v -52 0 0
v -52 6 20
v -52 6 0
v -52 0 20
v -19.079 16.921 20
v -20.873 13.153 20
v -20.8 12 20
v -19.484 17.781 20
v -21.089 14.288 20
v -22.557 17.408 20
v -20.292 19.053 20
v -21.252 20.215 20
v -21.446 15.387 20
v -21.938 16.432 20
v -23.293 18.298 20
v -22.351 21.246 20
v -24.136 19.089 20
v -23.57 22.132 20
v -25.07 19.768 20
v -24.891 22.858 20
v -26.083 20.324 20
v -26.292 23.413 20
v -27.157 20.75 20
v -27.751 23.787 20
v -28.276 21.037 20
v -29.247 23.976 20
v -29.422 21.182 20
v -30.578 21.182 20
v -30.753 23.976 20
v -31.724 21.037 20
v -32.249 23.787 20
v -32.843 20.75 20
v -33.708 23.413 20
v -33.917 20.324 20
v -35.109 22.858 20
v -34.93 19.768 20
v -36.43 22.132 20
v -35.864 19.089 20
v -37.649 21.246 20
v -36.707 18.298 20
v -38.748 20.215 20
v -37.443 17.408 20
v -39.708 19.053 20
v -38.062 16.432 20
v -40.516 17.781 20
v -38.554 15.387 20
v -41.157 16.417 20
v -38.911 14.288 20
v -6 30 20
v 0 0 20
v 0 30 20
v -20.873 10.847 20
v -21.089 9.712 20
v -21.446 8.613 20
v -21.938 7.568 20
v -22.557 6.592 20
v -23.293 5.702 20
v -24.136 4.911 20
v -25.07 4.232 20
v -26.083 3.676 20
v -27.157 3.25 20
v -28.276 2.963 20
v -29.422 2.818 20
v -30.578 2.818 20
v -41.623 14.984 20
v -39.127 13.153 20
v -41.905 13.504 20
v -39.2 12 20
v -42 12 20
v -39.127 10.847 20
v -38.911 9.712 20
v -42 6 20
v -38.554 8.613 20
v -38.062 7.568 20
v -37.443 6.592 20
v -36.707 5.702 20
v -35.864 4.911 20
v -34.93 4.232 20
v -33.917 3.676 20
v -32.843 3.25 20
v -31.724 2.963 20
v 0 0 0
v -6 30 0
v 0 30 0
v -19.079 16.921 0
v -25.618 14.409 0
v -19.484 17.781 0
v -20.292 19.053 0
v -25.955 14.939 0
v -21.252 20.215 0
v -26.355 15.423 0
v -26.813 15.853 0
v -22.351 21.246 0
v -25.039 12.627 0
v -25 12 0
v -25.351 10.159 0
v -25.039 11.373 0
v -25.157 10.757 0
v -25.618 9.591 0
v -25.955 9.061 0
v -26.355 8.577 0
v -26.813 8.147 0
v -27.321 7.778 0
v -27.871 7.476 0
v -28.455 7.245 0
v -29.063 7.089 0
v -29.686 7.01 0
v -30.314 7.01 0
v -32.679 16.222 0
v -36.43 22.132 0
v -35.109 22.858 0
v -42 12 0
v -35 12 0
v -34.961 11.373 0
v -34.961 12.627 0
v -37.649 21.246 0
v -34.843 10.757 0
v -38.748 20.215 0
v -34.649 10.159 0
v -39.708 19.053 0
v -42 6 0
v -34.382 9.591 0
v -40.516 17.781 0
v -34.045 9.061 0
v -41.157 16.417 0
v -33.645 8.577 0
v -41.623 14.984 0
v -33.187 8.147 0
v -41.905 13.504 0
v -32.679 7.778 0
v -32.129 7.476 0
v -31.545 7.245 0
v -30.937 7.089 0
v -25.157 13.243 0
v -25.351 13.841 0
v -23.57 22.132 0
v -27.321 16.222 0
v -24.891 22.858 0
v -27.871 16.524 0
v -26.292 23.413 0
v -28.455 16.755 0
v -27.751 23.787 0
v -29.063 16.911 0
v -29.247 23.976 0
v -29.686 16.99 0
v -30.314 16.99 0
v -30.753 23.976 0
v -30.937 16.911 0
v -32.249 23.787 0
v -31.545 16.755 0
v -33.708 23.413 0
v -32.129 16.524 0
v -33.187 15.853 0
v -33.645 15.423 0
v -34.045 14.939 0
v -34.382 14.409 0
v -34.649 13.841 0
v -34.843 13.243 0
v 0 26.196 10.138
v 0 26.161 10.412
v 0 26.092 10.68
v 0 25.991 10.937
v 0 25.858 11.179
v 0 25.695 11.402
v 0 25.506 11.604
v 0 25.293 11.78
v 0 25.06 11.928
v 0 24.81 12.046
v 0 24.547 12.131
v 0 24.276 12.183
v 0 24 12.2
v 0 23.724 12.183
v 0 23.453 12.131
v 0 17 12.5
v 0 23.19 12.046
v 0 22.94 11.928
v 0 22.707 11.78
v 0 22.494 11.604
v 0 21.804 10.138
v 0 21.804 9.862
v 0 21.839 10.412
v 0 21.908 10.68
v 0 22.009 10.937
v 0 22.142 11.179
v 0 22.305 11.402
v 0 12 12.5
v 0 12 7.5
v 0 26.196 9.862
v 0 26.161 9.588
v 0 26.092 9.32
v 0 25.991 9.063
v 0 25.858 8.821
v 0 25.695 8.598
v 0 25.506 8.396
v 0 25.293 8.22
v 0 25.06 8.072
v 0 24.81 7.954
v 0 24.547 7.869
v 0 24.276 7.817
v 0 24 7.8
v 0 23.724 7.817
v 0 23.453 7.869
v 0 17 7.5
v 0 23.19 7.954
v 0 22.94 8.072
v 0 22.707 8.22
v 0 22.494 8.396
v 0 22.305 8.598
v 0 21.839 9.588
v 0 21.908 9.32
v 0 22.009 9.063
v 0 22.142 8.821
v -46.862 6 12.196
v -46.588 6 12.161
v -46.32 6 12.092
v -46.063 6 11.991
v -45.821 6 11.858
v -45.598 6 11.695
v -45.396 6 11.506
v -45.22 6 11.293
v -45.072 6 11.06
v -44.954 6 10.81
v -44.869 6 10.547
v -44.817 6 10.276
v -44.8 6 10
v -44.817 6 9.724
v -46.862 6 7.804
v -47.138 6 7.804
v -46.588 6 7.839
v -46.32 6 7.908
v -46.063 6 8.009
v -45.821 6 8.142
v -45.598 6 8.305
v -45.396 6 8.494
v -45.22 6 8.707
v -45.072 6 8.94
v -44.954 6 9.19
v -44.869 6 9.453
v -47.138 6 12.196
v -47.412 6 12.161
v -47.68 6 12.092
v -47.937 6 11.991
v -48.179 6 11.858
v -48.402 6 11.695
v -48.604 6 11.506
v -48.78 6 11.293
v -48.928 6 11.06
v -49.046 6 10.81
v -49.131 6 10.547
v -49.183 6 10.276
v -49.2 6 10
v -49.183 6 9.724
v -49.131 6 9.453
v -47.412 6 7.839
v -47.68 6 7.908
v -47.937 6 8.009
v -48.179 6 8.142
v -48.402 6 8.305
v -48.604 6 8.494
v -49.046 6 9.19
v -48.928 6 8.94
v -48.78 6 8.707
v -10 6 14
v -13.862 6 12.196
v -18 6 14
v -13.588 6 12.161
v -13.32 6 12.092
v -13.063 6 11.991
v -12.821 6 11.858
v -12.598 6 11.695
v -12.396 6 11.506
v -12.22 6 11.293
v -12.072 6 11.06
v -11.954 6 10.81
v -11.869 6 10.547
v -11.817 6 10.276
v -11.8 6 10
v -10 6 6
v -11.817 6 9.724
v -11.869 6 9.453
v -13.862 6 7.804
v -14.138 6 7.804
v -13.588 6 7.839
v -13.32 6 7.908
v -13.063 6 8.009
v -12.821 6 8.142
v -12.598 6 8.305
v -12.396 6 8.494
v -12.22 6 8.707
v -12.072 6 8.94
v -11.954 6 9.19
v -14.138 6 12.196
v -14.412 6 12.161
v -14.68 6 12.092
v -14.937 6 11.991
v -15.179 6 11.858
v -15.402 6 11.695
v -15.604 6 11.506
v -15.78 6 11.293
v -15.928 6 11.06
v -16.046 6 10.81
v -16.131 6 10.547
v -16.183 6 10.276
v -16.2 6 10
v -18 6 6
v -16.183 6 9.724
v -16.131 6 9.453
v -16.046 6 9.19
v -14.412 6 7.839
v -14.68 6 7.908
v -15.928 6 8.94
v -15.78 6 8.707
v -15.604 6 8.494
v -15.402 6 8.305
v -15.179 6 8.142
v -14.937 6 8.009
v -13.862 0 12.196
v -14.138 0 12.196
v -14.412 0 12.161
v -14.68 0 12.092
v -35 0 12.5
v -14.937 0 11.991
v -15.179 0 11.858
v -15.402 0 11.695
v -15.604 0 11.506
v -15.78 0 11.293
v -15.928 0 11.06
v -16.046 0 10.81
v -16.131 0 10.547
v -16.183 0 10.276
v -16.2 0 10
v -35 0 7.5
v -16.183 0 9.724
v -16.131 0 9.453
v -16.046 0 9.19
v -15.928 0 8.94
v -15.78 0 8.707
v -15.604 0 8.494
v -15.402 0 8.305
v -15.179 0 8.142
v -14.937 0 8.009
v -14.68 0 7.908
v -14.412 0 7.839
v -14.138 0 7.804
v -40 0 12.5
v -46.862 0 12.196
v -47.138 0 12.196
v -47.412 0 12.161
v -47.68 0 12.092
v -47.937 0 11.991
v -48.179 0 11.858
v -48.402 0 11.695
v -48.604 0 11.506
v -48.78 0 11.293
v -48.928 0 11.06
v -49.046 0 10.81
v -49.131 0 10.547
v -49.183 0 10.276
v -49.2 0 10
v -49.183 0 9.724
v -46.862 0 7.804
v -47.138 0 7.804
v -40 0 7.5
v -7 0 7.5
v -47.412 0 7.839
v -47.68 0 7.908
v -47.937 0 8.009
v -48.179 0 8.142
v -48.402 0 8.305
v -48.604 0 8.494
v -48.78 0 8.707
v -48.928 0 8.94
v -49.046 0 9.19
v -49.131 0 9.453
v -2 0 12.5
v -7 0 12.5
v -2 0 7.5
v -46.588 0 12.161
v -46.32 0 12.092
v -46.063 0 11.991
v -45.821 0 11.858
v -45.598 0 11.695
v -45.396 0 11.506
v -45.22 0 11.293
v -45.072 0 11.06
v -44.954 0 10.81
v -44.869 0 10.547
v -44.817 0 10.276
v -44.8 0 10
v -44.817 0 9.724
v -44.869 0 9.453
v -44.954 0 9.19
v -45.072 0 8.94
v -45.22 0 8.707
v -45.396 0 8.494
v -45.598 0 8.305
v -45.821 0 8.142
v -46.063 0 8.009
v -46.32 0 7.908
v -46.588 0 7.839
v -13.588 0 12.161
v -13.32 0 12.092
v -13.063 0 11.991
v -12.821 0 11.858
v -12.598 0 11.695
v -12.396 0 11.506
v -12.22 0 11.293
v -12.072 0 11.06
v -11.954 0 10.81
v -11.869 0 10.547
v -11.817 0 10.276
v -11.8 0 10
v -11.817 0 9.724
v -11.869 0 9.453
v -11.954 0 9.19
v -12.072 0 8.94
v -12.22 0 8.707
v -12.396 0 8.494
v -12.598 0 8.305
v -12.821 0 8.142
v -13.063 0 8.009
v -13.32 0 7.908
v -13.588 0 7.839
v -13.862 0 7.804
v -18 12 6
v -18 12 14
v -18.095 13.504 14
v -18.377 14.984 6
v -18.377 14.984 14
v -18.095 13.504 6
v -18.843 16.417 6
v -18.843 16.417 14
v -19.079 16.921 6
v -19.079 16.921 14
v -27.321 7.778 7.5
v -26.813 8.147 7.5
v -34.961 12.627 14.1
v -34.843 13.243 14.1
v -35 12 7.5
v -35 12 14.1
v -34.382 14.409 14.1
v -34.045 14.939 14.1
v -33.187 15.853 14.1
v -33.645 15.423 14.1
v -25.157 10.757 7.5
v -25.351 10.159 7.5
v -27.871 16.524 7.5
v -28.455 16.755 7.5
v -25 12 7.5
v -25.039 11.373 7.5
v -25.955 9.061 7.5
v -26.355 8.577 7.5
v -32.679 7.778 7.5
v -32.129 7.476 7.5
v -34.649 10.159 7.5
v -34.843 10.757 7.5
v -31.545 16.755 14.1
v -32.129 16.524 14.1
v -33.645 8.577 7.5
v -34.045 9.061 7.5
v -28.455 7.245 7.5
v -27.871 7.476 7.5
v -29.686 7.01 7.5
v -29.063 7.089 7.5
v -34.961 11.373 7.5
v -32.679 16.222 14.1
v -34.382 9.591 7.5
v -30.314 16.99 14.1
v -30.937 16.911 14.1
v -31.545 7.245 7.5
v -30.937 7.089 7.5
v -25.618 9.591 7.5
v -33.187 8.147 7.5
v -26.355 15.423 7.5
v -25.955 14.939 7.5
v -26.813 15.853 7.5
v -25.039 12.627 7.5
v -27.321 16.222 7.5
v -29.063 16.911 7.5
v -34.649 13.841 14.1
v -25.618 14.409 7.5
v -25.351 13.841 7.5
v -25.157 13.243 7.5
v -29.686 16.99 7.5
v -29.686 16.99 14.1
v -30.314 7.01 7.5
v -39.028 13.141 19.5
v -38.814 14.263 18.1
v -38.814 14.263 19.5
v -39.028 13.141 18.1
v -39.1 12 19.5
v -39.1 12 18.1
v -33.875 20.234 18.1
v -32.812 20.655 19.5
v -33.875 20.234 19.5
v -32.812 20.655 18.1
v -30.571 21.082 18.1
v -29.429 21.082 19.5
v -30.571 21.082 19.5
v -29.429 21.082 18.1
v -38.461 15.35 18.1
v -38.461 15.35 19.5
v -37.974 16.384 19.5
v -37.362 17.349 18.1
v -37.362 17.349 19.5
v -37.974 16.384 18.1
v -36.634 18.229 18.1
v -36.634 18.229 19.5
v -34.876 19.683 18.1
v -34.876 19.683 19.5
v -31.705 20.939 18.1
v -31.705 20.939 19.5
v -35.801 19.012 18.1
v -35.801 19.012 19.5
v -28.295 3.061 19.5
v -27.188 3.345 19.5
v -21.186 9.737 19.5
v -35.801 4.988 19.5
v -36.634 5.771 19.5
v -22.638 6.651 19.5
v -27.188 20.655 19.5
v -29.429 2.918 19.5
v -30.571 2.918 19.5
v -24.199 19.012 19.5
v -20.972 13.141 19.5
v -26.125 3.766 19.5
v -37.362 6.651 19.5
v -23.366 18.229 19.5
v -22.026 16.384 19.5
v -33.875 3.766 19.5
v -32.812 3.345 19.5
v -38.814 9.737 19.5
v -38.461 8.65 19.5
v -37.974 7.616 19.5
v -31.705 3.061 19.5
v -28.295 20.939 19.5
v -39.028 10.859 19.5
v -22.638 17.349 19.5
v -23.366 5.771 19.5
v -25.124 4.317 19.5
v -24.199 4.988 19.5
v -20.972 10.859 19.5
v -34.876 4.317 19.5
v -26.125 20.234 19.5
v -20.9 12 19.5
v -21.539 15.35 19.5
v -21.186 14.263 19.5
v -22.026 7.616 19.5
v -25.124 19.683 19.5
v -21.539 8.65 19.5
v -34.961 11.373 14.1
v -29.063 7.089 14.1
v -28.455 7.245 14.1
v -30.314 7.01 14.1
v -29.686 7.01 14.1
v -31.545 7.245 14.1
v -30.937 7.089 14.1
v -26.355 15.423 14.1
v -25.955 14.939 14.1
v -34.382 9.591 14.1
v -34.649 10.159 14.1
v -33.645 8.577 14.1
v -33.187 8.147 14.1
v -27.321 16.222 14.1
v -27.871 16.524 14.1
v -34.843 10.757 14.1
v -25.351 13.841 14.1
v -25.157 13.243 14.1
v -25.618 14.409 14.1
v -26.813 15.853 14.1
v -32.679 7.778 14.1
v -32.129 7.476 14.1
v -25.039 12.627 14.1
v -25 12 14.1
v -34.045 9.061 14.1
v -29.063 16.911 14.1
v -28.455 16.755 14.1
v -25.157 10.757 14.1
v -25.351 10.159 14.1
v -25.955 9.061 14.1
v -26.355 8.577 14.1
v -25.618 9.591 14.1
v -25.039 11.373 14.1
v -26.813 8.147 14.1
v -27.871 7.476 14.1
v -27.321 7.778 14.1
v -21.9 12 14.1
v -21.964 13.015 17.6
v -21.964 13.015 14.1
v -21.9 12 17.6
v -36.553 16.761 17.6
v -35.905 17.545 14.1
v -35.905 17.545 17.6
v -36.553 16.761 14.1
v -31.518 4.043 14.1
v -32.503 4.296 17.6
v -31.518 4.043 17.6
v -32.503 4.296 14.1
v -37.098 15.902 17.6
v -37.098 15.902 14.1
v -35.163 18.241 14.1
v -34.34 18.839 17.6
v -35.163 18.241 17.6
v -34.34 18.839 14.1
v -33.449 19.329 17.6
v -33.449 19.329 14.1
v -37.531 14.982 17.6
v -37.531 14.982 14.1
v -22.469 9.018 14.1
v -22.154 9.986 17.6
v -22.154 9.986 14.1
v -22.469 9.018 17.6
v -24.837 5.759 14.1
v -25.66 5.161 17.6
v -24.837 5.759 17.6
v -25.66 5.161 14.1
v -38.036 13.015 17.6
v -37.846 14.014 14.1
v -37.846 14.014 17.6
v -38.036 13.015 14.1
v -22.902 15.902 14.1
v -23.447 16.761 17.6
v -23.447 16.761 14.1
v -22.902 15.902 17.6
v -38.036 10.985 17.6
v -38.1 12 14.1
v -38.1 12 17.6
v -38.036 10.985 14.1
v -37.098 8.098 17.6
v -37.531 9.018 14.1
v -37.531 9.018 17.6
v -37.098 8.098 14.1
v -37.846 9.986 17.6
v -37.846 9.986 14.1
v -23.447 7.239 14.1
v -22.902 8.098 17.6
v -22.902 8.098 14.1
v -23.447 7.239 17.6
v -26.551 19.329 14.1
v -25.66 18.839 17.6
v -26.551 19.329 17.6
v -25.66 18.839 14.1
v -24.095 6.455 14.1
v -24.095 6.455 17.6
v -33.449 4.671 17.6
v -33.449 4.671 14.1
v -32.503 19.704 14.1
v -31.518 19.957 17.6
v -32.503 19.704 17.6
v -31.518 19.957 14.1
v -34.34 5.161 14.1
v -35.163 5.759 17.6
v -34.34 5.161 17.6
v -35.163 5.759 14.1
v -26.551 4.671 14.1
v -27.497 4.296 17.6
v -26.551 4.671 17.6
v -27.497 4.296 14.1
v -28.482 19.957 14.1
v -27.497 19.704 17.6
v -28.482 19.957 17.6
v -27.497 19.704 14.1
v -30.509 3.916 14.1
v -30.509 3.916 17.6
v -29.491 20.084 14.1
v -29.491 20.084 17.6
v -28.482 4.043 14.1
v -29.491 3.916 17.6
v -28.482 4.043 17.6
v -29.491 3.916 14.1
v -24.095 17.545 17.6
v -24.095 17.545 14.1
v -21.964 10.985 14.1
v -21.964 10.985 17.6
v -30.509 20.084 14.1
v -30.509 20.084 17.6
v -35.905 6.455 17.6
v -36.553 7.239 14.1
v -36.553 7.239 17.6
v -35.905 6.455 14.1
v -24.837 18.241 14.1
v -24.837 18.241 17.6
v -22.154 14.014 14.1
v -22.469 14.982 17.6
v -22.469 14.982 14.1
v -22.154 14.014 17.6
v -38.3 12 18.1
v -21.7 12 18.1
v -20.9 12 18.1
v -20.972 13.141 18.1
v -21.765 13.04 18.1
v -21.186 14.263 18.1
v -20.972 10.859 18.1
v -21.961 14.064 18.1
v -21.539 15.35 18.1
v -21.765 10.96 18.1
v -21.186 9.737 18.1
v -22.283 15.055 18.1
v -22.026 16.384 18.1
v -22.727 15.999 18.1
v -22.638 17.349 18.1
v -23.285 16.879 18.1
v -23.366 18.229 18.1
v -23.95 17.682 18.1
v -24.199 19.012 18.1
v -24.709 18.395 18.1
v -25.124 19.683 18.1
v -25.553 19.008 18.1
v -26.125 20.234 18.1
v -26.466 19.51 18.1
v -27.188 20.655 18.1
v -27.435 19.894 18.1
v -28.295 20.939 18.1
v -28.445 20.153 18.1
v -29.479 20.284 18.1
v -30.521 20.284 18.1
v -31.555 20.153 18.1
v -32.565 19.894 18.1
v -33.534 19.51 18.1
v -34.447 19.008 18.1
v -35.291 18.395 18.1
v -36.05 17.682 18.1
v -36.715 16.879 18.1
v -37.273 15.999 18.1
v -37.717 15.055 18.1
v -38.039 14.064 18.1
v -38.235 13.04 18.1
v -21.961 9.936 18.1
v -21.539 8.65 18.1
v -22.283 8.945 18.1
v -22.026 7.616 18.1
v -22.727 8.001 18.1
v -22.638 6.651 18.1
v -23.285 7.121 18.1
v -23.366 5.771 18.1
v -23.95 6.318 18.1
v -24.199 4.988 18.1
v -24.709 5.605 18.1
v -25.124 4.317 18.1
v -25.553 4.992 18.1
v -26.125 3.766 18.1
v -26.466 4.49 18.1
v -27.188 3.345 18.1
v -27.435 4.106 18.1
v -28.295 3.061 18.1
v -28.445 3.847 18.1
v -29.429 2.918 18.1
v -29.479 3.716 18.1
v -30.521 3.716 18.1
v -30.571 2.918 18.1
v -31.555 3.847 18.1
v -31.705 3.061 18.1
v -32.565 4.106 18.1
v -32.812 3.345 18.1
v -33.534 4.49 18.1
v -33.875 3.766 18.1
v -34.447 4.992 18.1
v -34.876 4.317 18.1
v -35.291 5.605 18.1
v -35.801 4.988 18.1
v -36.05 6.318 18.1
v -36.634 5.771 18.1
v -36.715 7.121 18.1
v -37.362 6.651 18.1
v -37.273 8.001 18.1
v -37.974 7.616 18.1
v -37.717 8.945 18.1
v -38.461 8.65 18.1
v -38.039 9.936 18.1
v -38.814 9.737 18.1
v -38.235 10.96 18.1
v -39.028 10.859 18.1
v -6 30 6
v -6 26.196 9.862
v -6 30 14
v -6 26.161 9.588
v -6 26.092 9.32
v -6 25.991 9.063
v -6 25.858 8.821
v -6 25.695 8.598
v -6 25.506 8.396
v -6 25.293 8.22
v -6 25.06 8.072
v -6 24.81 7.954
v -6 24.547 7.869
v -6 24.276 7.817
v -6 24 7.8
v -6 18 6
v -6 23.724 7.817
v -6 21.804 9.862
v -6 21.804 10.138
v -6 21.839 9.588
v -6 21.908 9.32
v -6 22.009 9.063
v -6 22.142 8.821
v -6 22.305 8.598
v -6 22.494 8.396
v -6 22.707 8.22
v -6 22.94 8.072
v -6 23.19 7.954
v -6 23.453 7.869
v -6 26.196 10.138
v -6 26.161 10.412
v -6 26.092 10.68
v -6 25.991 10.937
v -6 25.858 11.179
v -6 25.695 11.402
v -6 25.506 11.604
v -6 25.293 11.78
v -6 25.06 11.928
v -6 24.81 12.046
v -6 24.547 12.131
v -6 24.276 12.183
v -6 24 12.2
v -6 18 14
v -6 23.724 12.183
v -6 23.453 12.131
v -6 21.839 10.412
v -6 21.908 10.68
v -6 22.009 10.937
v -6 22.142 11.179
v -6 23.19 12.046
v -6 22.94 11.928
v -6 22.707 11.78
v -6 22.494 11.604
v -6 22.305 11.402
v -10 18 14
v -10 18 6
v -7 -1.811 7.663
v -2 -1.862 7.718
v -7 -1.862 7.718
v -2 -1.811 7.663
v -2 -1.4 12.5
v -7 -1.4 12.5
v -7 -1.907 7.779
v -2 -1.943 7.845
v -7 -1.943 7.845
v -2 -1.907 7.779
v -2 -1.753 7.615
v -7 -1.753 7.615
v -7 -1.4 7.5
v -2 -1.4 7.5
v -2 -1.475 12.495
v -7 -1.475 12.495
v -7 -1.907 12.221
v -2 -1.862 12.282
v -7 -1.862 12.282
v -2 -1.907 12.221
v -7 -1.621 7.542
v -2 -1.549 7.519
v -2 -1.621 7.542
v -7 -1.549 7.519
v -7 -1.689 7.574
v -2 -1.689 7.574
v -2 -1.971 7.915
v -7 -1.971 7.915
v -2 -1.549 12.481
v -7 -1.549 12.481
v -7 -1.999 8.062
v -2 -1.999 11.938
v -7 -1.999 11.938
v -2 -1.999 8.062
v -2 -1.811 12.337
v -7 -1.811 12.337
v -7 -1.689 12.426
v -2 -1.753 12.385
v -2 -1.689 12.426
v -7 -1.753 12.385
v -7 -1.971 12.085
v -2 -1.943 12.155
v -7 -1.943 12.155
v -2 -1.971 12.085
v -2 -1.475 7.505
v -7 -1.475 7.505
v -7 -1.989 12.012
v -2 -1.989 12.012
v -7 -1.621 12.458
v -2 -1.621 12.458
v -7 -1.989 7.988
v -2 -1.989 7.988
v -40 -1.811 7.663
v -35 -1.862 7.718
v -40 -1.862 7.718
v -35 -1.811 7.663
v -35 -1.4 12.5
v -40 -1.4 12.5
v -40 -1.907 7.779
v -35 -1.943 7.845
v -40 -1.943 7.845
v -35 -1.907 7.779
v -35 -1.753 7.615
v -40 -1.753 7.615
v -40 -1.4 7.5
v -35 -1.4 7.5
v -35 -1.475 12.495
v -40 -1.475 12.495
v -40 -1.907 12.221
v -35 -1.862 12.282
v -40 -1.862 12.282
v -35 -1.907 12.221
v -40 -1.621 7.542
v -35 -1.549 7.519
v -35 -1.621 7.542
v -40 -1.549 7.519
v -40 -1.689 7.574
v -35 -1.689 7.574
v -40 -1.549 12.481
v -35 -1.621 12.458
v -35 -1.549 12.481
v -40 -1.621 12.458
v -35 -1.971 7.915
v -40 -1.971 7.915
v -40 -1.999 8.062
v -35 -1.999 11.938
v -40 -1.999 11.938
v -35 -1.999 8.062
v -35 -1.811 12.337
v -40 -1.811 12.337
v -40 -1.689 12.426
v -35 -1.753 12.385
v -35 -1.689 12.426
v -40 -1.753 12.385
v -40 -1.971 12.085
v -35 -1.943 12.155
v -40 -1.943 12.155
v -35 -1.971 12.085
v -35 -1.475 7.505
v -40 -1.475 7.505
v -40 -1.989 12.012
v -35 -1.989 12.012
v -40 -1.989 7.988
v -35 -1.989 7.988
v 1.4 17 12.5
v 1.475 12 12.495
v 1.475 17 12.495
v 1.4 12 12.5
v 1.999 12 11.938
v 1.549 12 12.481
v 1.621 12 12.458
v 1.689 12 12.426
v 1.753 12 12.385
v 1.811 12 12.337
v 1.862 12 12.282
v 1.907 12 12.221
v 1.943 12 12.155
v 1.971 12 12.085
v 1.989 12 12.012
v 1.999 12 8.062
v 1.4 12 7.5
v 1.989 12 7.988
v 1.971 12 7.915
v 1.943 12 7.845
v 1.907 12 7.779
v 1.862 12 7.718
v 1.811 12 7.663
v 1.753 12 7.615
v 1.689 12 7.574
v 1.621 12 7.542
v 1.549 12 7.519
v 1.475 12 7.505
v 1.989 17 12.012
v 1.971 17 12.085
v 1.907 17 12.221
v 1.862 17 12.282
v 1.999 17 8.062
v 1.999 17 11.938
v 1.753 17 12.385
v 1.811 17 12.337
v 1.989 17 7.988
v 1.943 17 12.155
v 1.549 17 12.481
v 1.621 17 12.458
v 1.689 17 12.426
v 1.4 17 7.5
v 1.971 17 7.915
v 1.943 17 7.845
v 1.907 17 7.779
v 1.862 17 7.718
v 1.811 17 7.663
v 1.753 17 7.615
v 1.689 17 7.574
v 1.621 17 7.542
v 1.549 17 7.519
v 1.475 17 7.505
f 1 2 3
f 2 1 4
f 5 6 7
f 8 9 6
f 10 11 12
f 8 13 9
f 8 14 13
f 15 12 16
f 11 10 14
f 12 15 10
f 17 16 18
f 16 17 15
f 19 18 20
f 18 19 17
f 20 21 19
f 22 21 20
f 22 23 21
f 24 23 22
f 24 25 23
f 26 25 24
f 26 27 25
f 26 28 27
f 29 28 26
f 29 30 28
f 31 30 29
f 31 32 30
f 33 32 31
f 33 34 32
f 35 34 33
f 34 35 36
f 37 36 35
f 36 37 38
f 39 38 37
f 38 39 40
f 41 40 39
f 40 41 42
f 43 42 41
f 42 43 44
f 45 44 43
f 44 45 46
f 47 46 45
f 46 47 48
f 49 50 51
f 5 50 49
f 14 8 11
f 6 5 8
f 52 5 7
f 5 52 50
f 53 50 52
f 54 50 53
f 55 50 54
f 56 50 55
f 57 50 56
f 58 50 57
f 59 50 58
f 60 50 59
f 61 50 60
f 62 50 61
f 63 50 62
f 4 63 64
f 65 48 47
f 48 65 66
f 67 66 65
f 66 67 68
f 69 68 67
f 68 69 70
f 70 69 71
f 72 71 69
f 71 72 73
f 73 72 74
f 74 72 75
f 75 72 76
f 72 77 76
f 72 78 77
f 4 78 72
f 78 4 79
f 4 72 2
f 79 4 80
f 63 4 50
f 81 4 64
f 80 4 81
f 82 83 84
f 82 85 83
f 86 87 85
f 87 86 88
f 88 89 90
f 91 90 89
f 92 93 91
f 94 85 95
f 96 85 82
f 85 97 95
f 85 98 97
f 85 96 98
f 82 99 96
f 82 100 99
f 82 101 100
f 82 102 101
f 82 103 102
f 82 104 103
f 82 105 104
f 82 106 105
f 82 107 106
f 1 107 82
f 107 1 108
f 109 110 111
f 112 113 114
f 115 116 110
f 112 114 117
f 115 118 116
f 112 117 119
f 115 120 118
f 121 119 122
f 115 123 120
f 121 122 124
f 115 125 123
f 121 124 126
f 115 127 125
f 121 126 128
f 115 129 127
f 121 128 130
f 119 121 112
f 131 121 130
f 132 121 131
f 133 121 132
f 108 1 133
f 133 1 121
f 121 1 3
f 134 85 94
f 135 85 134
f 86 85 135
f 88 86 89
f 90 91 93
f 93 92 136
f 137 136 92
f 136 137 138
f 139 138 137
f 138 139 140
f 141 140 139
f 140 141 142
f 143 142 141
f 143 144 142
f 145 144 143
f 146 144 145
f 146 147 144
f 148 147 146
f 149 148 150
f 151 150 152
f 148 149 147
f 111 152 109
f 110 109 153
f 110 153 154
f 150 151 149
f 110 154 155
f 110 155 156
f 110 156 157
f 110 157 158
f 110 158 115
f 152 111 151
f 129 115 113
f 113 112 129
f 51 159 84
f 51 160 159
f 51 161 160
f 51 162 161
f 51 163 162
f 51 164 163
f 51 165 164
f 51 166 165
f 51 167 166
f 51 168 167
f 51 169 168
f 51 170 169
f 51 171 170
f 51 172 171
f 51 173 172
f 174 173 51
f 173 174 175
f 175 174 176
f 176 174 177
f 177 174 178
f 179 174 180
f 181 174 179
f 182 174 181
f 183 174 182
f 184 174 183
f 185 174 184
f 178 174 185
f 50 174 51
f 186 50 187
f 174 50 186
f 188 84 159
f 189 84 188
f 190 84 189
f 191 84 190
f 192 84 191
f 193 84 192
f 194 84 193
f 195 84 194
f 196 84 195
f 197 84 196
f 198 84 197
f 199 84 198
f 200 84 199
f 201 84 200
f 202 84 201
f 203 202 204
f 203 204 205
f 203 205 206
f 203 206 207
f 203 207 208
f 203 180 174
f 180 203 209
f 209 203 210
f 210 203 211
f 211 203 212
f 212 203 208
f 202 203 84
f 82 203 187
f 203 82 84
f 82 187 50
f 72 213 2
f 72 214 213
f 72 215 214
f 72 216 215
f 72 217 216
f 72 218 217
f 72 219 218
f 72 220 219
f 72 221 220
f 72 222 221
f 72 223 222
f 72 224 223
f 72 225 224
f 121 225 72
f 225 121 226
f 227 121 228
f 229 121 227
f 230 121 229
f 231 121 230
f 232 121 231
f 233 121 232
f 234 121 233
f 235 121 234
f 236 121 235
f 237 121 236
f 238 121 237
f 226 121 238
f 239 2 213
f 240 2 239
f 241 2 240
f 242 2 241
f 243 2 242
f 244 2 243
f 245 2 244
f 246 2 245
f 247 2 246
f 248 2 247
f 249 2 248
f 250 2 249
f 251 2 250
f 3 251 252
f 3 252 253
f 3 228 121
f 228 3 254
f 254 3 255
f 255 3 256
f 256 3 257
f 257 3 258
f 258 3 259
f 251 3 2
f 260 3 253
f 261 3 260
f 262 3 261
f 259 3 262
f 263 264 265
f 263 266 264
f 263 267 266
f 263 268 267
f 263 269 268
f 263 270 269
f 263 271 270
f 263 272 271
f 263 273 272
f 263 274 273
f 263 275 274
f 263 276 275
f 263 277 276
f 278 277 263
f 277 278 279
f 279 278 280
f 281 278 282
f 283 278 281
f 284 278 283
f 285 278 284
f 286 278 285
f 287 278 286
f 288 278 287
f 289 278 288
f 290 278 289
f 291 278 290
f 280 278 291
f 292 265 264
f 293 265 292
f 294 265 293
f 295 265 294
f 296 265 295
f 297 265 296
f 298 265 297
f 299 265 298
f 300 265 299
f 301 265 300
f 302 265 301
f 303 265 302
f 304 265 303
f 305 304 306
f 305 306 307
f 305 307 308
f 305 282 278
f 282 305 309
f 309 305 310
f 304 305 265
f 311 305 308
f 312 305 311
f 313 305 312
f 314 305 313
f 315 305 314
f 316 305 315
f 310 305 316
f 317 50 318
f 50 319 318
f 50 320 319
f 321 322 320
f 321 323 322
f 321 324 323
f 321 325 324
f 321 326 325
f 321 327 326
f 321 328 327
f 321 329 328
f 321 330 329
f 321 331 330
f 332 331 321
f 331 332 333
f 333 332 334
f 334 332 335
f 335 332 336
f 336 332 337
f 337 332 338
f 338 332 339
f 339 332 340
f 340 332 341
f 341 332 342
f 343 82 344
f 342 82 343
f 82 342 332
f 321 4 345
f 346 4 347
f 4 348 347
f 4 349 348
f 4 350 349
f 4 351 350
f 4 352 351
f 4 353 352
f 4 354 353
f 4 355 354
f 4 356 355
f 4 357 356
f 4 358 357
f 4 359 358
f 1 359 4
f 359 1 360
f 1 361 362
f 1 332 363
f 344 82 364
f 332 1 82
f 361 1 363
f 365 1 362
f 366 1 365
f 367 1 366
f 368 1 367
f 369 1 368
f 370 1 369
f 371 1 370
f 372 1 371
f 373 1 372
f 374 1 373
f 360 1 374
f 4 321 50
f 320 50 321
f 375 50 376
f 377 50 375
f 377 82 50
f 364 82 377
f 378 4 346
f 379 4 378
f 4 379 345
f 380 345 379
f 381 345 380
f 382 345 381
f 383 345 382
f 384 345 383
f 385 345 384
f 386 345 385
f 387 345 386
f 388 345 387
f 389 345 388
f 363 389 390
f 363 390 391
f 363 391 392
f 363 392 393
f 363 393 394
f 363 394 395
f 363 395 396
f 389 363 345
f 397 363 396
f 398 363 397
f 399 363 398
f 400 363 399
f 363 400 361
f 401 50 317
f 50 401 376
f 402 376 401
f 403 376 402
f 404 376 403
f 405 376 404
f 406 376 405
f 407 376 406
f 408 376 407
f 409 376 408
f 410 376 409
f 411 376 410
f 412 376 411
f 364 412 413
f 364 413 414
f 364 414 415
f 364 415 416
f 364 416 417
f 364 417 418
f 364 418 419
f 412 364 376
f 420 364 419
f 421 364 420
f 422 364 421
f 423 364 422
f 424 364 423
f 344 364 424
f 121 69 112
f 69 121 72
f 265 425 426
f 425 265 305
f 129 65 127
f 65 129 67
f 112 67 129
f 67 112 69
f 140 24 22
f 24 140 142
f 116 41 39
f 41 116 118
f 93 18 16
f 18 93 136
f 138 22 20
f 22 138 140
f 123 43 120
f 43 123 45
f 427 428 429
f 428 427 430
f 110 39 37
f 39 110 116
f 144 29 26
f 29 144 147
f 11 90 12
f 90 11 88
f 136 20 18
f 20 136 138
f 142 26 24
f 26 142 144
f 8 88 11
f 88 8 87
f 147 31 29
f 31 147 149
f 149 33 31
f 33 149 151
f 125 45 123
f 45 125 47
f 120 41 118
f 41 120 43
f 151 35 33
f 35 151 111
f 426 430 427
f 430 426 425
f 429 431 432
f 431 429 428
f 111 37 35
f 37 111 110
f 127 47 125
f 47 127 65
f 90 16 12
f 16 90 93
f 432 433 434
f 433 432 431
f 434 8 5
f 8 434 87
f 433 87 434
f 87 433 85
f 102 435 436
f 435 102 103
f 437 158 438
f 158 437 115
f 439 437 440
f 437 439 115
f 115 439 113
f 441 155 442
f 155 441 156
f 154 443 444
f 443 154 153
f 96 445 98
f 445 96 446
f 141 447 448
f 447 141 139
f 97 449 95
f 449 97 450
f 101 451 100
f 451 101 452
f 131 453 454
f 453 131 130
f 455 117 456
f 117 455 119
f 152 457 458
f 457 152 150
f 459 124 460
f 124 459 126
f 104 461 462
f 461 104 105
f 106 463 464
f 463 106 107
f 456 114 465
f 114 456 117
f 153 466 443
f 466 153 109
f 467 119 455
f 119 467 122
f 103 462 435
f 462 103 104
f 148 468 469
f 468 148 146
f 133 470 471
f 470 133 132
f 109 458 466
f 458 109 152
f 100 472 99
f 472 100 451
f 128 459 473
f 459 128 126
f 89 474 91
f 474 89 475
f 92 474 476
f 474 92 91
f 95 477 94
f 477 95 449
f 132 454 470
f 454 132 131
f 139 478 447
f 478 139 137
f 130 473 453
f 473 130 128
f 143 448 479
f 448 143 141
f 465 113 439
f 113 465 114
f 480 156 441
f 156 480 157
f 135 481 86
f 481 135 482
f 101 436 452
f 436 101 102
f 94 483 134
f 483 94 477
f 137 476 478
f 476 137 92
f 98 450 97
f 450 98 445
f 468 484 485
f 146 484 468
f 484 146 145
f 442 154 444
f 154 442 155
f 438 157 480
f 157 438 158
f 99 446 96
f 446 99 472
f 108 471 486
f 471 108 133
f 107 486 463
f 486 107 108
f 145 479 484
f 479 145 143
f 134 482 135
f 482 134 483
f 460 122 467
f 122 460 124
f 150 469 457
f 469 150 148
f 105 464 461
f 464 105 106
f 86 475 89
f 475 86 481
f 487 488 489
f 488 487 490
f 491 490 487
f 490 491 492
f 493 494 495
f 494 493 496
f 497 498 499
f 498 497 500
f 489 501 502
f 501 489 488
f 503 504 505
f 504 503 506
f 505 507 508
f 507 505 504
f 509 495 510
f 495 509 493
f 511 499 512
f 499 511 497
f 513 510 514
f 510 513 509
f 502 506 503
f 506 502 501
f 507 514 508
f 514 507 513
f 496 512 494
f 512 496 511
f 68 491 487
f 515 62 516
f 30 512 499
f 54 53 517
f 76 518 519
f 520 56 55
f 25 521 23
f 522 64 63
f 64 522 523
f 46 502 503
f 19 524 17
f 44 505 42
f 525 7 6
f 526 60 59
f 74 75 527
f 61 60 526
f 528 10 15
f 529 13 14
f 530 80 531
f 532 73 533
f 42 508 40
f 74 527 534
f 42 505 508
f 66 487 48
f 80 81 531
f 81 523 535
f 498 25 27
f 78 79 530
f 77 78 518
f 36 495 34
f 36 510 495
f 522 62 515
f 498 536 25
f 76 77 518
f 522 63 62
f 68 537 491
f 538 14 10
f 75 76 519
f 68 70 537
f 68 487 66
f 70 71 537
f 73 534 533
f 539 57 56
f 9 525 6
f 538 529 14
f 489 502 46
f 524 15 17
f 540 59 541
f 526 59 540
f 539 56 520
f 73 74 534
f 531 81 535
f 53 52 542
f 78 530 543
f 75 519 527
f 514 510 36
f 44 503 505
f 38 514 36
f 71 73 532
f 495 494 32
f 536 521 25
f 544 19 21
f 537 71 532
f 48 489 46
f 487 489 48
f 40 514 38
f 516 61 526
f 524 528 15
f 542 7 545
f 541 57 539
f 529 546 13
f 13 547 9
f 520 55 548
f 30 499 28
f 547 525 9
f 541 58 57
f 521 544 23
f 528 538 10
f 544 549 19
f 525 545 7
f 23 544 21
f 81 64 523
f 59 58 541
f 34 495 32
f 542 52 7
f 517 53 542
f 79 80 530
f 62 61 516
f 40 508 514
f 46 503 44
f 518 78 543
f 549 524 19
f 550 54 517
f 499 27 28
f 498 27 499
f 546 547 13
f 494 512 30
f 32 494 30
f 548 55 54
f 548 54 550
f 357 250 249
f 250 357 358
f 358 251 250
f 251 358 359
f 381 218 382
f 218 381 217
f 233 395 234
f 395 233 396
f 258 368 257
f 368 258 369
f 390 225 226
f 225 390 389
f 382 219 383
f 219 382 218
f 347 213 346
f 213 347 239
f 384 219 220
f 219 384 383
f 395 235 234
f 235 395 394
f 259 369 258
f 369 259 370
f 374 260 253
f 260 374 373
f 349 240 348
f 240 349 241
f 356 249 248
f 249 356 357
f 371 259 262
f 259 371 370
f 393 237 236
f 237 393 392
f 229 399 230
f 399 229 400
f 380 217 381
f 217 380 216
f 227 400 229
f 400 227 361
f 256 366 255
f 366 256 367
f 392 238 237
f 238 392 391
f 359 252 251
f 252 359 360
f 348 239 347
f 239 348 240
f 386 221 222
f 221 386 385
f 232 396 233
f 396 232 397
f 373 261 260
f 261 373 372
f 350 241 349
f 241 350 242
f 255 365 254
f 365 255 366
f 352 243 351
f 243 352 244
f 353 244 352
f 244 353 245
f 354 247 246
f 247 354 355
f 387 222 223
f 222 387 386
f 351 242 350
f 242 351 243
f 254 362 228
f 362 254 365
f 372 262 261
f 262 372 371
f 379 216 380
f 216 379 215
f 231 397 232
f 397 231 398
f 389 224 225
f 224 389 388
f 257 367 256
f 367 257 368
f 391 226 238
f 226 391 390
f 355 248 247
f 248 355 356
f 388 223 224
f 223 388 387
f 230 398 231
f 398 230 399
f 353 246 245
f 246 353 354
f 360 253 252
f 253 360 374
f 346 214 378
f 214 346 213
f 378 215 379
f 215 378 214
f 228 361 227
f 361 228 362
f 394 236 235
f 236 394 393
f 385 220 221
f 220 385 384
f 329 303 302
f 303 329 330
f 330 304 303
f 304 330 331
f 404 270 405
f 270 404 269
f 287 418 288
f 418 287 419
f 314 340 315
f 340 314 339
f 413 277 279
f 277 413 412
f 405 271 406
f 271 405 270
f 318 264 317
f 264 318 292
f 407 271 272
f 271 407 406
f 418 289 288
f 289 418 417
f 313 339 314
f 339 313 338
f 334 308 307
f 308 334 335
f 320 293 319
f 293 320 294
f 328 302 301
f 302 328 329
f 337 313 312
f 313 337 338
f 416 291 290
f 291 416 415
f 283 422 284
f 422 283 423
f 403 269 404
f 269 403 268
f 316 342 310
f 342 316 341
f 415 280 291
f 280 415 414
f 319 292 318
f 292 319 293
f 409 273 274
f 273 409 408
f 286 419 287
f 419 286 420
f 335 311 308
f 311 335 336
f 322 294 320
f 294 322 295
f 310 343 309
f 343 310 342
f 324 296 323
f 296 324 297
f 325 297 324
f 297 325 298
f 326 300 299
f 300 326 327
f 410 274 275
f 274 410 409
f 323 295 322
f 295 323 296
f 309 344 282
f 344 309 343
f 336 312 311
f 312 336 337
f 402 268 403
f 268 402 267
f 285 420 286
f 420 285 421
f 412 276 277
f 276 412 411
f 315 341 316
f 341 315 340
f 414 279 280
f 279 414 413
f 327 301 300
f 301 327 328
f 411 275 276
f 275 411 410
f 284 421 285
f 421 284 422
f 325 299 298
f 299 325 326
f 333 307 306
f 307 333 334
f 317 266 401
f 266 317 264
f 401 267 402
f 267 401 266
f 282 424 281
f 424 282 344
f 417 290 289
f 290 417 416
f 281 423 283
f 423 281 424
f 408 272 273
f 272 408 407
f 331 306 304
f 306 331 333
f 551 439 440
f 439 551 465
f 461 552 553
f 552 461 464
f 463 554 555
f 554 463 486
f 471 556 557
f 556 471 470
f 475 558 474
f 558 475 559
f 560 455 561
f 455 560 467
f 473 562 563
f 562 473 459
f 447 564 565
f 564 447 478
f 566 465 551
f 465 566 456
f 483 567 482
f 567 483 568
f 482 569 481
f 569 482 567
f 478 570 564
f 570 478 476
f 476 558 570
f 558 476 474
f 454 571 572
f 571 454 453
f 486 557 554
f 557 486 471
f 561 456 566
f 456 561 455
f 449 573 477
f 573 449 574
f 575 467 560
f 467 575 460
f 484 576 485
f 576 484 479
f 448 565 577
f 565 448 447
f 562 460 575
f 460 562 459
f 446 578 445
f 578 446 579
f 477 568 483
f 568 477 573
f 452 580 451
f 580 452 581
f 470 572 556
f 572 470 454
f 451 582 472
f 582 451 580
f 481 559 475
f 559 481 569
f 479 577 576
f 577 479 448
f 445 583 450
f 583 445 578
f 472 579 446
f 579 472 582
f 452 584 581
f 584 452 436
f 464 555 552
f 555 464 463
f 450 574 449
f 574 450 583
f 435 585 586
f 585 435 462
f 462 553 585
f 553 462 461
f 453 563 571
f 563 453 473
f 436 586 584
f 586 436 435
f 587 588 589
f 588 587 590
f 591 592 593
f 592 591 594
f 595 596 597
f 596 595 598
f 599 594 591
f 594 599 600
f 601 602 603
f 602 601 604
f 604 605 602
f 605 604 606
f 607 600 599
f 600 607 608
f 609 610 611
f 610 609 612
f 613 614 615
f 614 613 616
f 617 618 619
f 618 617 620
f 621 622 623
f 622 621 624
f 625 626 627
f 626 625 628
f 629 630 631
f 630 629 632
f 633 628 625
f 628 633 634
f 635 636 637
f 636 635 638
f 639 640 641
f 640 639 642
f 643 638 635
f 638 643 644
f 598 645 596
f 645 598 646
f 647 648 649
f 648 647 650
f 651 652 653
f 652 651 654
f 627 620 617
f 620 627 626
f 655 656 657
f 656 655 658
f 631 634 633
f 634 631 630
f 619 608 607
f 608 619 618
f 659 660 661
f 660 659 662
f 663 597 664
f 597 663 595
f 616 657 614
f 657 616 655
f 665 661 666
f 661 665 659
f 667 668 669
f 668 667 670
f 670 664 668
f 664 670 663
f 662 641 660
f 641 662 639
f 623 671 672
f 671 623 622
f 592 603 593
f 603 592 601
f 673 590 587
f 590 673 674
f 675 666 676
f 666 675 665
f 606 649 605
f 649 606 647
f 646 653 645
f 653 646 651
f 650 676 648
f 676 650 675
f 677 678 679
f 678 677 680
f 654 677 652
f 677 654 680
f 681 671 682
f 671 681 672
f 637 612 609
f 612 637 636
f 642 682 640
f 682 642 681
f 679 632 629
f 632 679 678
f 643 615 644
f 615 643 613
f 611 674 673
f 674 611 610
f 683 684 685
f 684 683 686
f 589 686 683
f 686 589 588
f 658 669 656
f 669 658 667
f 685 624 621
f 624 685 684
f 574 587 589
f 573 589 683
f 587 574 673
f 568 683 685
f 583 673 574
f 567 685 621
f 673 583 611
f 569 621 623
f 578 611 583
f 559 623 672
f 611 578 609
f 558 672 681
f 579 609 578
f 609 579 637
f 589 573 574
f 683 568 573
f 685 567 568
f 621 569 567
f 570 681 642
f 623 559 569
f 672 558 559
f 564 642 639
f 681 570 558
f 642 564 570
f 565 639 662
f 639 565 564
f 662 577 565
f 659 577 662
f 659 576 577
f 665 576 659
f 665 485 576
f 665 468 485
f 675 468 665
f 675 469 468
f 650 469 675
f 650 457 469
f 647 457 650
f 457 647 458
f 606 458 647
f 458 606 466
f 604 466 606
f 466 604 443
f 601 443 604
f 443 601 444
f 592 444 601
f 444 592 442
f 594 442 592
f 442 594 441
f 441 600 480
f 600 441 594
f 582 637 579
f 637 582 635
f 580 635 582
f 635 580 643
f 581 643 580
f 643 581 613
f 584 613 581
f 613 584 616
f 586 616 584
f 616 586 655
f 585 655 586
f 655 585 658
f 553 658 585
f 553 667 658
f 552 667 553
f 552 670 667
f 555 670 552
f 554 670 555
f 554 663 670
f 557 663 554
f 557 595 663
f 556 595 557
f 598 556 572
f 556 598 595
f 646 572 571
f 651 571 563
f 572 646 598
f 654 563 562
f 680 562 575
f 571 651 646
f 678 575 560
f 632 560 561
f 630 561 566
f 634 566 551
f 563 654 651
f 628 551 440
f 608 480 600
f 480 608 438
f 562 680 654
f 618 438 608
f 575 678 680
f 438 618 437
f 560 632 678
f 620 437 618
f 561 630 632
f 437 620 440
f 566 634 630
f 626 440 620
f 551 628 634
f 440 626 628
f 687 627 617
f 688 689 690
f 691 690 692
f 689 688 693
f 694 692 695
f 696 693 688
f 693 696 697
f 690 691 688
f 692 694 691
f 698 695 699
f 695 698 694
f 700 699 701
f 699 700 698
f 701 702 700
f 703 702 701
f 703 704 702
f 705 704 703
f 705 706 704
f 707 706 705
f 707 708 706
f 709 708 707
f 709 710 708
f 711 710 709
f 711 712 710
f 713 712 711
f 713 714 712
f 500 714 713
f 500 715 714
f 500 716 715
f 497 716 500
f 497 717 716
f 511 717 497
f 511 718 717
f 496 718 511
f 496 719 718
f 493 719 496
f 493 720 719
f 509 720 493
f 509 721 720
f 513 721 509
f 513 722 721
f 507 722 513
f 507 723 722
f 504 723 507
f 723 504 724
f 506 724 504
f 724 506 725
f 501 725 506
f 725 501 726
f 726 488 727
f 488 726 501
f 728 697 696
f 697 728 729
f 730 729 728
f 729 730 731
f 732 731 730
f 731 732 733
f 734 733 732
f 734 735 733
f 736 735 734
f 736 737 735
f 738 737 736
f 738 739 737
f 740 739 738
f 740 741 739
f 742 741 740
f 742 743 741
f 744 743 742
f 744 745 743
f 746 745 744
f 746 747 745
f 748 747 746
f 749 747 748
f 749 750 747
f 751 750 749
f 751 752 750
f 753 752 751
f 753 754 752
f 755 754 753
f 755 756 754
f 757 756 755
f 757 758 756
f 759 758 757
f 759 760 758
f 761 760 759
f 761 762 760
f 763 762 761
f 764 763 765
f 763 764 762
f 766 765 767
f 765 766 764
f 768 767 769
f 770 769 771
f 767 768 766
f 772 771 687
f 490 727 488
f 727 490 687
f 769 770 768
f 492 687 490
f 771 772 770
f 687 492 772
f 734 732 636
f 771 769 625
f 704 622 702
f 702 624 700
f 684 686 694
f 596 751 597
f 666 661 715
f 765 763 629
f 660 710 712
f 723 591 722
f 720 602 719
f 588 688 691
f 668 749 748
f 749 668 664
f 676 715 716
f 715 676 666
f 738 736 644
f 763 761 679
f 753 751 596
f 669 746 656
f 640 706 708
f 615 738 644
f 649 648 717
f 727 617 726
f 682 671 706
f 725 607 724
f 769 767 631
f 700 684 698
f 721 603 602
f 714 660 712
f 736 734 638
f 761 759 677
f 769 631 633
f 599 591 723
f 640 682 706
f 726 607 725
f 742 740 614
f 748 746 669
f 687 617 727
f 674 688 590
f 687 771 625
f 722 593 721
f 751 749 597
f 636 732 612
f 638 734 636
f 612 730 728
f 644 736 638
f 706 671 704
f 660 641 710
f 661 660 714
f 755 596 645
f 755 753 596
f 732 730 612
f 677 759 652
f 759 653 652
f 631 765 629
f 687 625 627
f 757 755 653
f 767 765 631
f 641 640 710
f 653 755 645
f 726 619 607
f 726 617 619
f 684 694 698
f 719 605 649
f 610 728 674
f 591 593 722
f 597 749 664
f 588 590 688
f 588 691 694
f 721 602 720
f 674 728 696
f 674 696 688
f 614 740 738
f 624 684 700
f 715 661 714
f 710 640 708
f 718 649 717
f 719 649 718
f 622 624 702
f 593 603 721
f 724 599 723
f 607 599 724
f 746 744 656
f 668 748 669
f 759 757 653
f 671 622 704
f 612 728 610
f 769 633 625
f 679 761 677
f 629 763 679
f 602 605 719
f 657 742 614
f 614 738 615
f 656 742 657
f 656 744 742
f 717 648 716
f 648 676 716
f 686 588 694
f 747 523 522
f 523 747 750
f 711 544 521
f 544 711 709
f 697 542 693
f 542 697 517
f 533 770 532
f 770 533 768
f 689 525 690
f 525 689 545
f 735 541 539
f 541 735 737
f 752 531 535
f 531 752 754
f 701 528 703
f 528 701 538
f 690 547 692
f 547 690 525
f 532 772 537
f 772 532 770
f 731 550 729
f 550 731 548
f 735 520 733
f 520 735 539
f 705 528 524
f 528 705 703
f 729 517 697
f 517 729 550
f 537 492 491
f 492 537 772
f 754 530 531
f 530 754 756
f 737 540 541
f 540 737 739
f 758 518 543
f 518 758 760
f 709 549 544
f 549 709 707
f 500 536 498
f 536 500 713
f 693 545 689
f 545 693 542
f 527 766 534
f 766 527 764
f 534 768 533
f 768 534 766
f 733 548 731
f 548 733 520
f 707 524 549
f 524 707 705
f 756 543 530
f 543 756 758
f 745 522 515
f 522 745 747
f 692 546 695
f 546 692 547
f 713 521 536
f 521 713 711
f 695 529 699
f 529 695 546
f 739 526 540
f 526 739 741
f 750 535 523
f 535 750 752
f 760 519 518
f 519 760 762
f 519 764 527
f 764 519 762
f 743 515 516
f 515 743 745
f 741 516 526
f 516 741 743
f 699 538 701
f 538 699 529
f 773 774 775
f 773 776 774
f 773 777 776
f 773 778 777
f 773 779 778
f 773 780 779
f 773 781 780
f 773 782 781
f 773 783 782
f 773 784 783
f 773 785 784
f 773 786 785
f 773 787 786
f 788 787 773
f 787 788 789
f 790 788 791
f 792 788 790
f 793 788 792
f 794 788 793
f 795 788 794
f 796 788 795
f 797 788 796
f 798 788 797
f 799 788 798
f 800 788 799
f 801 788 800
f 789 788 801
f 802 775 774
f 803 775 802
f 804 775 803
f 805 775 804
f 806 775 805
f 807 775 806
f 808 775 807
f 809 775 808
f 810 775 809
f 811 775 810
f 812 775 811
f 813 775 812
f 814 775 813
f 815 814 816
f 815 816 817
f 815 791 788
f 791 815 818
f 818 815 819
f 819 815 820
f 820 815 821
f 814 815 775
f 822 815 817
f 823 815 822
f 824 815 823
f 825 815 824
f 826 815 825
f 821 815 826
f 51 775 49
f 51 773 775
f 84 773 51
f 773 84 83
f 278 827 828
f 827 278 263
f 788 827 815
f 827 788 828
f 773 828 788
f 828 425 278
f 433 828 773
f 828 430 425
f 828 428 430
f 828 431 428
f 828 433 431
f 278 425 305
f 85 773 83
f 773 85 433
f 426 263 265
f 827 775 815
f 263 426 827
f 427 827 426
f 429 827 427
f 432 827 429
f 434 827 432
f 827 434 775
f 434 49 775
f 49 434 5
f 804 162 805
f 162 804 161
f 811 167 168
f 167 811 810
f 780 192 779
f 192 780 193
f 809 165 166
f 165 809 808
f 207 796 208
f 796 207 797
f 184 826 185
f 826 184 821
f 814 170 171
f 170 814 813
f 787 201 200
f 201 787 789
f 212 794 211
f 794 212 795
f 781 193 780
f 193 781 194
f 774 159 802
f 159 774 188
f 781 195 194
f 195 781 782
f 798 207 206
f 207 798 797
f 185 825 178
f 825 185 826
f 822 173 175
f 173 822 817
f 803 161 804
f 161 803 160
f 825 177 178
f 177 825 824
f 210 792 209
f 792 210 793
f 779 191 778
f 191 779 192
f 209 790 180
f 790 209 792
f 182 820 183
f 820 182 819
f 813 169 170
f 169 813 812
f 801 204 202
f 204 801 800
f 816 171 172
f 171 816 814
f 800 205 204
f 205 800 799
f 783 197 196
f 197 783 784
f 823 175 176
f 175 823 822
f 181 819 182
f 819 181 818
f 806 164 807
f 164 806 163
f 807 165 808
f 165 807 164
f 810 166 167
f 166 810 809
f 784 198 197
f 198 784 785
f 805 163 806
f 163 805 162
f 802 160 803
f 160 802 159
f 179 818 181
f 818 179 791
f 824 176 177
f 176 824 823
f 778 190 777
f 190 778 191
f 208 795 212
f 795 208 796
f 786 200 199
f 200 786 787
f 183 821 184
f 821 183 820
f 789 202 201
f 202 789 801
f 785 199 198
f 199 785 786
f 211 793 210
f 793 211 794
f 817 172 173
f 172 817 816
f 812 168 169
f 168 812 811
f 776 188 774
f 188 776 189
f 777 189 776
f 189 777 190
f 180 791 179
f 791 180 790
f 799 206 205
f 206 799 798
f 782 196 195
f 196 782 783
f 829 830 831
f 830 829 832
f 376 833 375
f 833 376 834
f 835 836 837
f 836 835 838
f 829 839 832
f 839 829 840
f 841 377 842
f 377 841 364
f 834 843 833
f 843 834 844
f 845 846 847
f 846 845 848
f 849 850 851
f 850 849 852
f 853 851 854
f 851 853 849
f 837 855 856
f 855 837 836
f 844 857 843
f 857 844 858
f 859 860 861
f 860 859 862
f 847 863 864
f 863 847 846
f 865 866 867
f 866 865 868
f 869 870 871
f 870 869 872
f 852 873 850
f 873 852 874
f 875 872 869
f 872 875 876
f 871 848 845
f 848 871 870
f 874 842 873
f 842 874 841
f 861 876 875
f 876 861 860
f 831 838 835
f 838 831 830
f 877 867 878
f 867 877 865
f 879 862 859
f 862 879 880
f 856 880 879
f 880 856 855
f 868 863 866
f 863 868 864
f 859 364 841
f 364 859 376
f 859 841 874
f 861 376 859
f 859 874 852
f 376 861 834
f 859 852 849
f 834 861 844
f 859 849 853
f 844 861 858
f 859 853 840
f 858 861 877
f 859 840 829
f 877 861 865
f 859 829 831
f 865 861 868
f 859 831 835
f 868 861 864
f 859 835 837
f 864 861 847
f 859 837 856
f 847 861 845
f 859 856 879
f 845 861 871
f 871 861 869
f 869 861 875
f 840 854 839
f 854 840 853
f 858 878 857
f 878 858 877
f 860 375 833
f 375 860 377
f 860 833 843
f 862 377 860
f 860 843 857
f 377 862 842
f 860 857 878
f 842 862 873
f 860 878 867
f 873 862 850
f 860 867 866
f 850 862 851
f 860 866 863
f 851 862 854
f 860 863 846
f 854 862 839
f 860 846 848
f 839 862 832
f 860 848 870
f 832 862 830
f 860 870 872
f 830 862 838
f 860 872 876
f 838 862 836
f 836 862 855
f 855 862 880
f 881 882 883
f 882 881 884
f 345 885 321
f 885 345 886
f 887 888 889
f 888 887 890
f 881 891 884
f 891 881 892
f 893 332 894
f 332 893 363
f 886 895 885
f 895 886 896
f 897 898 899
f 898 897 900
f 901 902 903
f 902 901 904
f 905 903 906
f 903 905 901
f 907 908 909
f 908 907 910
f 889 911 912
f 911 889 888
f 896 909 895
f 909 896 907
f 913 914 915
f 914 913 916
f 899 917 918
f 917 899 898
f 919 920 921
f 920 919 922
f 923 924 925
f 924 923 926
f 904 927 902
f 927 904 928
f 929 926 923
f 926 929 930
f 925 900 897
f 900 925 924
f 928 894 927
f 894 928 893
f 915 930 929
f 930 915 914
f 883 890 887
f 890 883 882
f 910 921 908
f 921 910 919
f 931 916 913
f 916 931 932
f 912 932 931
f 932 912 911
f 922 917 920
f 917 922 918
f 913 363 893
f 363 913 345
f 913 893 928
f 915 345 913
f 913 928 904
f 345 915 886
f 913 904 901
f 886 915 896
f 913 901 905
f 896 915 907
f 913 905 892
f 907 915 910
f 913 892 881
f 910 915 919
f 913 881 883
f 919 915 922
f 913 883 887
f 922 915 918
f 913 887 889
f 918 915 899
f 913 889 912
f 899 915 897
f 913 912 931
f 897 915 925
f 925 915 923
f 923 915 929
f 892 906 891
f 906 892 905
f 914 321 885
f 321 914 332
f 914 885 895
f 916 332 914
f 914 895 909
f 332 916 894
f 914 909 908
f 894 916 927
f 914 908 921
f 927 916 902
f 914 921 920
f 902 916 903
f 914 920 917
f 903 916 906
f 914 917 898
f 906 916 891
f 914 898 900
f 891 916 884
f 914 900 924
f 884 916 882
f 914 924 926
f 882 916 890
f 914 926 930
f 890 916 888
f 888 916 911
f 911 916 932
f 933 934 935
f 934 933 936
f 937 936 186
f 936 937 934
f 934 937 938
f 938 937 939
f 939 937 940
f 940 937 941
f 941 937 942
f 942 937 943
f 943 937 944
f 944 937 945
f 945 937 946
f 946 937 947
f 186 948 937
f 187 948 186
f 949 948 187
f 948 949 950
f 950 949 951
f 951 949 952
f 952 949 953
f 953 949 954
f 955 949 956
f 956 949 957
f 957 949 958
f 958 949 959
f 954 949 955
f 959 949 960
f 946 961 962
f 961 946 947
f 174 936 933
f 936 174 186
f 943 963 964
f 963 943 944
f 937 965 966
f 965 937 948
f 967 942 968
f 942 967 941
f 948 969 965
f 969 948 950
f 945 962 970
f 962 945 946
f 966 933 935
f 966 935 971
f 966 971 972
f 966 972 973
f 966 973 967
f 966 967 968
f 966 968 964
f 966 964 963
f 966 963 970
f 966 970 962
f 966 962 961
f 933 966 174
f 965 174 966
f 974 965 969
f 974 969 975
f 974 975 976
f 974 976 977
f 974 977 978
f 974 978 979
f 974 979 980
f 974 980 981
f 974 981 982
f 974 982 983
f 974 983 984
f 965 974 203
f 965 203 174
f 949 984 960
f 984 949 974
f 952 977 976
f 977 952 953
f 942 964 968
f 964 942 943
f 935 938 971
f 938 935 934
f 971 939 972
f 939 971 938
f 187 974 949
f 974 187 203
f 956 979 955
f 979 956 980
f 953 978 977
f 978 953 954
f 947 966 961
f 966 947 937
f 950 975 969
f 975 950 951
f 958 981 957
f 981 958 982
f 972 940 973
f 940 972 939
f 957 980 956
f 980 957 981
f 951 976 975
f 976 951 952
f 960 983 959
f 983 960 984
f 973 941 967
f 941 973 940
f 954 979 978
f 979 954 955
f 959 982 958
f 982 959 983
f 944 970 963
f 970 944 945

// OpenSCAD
// file: ../lib/nutsnbolts/data-access.scad
// Norm Nuts and Bolts - a OpenSCAD library
// Copyright (C) 2012  Johannes Kneer

// This program is free software: you can redistribute it and/or modify
// it under the terms of the GNU General Public License as published by
// the Free Software Foundation, either version 3 of the License, or
// (at your option) any later version.

// This program is distributed in the hope that it will be useful,
// but WITHOUT ANY WARRANTY; without even the implied warranty of
// MERCHANTABILITY or FITNESS FOR A PARTICULAR PURPOSE.  See the
// GNU General Public License for more details.

// You should have received a copy of the GNU General Public License
// along with this program.  If not, see <http://www.gnu.org/licenses/>.


// DATABASE ACCESS FUNCTIONS AND CONSTANTS



// == CONSTANTS == 

// screw table access keys
_NB_S_DESC            = 0;
_NB_S_FAMKEY			 = 1;
_NB_S_LENGTH          = 2;
_NB_S_NOTHREAD_LENGTH = 3;

_NB_F_DESC			 = 0;
_NB_F_OUTER_DIA       = 1;
_NB_F_INNER_DIA       = 2;
_NB_F_LEAD            = 3; 
_NB_F_KEY             = 4;
_NB_F_KEY_DEPTH       = 5;
_NB_F_HEAD_HEIGHT     = 6;
_NB_F_HEAD_DIA        = 7;
_NB_F_NUT_KEY         = 8;
_NB_F_NUT_HEIGHT      = 9;


// == FUNCTIONS ==

// _get_screw("descriptor")   with descriptor = M8x25
//   find the line for a general object in the data matrix

function _get_screw(n) = data_screw[search([n], data_screw)[0]];
function _get_screw_fam(n) = data_screw_fam[search([_get_screw(n)[_NB_S_FAMKEY]], data_screw_fam)[0]];

function _get_fam(n) = data_screw_fam[search([n], data_screw_fam)[0]];


// _get_XXXXX("descriptor") functions
// find a single property in the database

function _get_desc(n)        = _get_screw(n)[_NB_S_DESC];
function _get_famkey(n)         = _get_screw(n)[_NB_S_FAMKEY];
function _get_length(n)      = _get_screw(n)[_NB_S_LENGTH];
function _get_nt_length(n)   = _get_screw(n)[_NB_S_NOTHREAD_LENGTH];

function _get_outer_dia(n)   = _get_screw_fam(n)[_NB_F_OUTER_DIA];
function _get_inner_dia(n)   = _get_screw_fam(n)[_NB_F_INNER_DIA];
function _get_lead(n)        = _get_screw_fam(n)[_NB_F_LEAD];
function _get_head_height(n) = _get_screw_fam(n)[_NB_F_HEAD_HEIGHT];
function _get_head_dia(n)    = _get_screw_fam(n)[_NB_F_HEAD_DIA];
function _get_nut_key(n)     = _get_screw_fam(n)[_NB_F_NUT_KEY];
function _get_nut_height(n)  = _get_screw_fam(n)[_NB_F_NUT_HEIGHT];
// file: ../globals.scad
// Global variables

$fn = 50;
clearance = 0.4; // Nozzle width
// file: f688zz.scad
include <../globals.scad>;

module f688zz_mount()
{
    difference(){
        cylinder(d=24,h=12);
        cylinder(d=10,h=12);
        translate([0,0,7-clearance])cylinder(d=16+clearance/2,h=12);
        translate([0,0,10.3-clearance/2])cylinder(d1=16+clearance/2,d2=16.4+clearance/2,h=0.5);
        translate([0,0,10.8-clearance/2])cylinder(d=18+clearance/2,h=12);
    }
} 
// main file
include <f688zz.scad>
include <../lib/nutsnbolts/cyl_head_bolt.scad>;

module gantry_y_back_right_front_left()
{
    mirror([1,0,0]){
        difference(){
            union(){
                cube([52,6,20]);
                translate([18,0,0])cube([24,12,20]);
                translate([30,12,0])cylinder(d=24,h=20);
            }
            translate([30,12,0])cylinder(d=10,h=7.5);
            translate([30,12,7.5])cylinder(d=18+clearance/2,h=12);
            translate([30,12,19.5])cylinder(d1=18+clearance/2,d2=18+clearance,h=0.5);
            translate([47,0,10])rotate([90,0,0])hole_through("M4",l=8, cld=clearance);
            translate([14,0,10])rotate([90,0,0])hole_through("M4",l=8, cld=clearance);
        }
        translate([30,12,7.5])f688zz_mount();
        
        intersection(){
            difference(){
                union(){
                    cube([6,30,20]);
                    cube([10,18,20]);
                    translate([6,-18,0])rotate([0,0,45])cube([24*sqrt(2),24*sqrt(2),6]);
                    translate([6,-18,14])rotate([0,0,45])cube([24*sqrt(2),24*sqrt(2),6]);
                }
                translate([0,24,10])rotate([0,-90,0])hole_through("M4",l=8, cld=clearance);
            }
            cube([20,30,20]);
        }
        
    
        
        translate([7,-2,7.5])rotate([0,-90,0])translate([0.6,0.6,0])minkowski(){
            cube([3.8,2,4]);
            cylinder(d=1.2,h=1);
        }
        translate([40,-2,7.5])rotate([0,-90,0])translate([0.6,0.6,0])minkowski(){
            cube([3.8,2,4]);
            cylinder(d=1.2,h=1);
        }
        translate([1.2,17,7.5])rotate([0,-90,90])translate([0.6,0.6,0])minkowski(){
            cube([3.8,2,4]);
            cylinder(d=1.2,h=1);
        }
    }
}

gantry_y_back_right_front_left();
